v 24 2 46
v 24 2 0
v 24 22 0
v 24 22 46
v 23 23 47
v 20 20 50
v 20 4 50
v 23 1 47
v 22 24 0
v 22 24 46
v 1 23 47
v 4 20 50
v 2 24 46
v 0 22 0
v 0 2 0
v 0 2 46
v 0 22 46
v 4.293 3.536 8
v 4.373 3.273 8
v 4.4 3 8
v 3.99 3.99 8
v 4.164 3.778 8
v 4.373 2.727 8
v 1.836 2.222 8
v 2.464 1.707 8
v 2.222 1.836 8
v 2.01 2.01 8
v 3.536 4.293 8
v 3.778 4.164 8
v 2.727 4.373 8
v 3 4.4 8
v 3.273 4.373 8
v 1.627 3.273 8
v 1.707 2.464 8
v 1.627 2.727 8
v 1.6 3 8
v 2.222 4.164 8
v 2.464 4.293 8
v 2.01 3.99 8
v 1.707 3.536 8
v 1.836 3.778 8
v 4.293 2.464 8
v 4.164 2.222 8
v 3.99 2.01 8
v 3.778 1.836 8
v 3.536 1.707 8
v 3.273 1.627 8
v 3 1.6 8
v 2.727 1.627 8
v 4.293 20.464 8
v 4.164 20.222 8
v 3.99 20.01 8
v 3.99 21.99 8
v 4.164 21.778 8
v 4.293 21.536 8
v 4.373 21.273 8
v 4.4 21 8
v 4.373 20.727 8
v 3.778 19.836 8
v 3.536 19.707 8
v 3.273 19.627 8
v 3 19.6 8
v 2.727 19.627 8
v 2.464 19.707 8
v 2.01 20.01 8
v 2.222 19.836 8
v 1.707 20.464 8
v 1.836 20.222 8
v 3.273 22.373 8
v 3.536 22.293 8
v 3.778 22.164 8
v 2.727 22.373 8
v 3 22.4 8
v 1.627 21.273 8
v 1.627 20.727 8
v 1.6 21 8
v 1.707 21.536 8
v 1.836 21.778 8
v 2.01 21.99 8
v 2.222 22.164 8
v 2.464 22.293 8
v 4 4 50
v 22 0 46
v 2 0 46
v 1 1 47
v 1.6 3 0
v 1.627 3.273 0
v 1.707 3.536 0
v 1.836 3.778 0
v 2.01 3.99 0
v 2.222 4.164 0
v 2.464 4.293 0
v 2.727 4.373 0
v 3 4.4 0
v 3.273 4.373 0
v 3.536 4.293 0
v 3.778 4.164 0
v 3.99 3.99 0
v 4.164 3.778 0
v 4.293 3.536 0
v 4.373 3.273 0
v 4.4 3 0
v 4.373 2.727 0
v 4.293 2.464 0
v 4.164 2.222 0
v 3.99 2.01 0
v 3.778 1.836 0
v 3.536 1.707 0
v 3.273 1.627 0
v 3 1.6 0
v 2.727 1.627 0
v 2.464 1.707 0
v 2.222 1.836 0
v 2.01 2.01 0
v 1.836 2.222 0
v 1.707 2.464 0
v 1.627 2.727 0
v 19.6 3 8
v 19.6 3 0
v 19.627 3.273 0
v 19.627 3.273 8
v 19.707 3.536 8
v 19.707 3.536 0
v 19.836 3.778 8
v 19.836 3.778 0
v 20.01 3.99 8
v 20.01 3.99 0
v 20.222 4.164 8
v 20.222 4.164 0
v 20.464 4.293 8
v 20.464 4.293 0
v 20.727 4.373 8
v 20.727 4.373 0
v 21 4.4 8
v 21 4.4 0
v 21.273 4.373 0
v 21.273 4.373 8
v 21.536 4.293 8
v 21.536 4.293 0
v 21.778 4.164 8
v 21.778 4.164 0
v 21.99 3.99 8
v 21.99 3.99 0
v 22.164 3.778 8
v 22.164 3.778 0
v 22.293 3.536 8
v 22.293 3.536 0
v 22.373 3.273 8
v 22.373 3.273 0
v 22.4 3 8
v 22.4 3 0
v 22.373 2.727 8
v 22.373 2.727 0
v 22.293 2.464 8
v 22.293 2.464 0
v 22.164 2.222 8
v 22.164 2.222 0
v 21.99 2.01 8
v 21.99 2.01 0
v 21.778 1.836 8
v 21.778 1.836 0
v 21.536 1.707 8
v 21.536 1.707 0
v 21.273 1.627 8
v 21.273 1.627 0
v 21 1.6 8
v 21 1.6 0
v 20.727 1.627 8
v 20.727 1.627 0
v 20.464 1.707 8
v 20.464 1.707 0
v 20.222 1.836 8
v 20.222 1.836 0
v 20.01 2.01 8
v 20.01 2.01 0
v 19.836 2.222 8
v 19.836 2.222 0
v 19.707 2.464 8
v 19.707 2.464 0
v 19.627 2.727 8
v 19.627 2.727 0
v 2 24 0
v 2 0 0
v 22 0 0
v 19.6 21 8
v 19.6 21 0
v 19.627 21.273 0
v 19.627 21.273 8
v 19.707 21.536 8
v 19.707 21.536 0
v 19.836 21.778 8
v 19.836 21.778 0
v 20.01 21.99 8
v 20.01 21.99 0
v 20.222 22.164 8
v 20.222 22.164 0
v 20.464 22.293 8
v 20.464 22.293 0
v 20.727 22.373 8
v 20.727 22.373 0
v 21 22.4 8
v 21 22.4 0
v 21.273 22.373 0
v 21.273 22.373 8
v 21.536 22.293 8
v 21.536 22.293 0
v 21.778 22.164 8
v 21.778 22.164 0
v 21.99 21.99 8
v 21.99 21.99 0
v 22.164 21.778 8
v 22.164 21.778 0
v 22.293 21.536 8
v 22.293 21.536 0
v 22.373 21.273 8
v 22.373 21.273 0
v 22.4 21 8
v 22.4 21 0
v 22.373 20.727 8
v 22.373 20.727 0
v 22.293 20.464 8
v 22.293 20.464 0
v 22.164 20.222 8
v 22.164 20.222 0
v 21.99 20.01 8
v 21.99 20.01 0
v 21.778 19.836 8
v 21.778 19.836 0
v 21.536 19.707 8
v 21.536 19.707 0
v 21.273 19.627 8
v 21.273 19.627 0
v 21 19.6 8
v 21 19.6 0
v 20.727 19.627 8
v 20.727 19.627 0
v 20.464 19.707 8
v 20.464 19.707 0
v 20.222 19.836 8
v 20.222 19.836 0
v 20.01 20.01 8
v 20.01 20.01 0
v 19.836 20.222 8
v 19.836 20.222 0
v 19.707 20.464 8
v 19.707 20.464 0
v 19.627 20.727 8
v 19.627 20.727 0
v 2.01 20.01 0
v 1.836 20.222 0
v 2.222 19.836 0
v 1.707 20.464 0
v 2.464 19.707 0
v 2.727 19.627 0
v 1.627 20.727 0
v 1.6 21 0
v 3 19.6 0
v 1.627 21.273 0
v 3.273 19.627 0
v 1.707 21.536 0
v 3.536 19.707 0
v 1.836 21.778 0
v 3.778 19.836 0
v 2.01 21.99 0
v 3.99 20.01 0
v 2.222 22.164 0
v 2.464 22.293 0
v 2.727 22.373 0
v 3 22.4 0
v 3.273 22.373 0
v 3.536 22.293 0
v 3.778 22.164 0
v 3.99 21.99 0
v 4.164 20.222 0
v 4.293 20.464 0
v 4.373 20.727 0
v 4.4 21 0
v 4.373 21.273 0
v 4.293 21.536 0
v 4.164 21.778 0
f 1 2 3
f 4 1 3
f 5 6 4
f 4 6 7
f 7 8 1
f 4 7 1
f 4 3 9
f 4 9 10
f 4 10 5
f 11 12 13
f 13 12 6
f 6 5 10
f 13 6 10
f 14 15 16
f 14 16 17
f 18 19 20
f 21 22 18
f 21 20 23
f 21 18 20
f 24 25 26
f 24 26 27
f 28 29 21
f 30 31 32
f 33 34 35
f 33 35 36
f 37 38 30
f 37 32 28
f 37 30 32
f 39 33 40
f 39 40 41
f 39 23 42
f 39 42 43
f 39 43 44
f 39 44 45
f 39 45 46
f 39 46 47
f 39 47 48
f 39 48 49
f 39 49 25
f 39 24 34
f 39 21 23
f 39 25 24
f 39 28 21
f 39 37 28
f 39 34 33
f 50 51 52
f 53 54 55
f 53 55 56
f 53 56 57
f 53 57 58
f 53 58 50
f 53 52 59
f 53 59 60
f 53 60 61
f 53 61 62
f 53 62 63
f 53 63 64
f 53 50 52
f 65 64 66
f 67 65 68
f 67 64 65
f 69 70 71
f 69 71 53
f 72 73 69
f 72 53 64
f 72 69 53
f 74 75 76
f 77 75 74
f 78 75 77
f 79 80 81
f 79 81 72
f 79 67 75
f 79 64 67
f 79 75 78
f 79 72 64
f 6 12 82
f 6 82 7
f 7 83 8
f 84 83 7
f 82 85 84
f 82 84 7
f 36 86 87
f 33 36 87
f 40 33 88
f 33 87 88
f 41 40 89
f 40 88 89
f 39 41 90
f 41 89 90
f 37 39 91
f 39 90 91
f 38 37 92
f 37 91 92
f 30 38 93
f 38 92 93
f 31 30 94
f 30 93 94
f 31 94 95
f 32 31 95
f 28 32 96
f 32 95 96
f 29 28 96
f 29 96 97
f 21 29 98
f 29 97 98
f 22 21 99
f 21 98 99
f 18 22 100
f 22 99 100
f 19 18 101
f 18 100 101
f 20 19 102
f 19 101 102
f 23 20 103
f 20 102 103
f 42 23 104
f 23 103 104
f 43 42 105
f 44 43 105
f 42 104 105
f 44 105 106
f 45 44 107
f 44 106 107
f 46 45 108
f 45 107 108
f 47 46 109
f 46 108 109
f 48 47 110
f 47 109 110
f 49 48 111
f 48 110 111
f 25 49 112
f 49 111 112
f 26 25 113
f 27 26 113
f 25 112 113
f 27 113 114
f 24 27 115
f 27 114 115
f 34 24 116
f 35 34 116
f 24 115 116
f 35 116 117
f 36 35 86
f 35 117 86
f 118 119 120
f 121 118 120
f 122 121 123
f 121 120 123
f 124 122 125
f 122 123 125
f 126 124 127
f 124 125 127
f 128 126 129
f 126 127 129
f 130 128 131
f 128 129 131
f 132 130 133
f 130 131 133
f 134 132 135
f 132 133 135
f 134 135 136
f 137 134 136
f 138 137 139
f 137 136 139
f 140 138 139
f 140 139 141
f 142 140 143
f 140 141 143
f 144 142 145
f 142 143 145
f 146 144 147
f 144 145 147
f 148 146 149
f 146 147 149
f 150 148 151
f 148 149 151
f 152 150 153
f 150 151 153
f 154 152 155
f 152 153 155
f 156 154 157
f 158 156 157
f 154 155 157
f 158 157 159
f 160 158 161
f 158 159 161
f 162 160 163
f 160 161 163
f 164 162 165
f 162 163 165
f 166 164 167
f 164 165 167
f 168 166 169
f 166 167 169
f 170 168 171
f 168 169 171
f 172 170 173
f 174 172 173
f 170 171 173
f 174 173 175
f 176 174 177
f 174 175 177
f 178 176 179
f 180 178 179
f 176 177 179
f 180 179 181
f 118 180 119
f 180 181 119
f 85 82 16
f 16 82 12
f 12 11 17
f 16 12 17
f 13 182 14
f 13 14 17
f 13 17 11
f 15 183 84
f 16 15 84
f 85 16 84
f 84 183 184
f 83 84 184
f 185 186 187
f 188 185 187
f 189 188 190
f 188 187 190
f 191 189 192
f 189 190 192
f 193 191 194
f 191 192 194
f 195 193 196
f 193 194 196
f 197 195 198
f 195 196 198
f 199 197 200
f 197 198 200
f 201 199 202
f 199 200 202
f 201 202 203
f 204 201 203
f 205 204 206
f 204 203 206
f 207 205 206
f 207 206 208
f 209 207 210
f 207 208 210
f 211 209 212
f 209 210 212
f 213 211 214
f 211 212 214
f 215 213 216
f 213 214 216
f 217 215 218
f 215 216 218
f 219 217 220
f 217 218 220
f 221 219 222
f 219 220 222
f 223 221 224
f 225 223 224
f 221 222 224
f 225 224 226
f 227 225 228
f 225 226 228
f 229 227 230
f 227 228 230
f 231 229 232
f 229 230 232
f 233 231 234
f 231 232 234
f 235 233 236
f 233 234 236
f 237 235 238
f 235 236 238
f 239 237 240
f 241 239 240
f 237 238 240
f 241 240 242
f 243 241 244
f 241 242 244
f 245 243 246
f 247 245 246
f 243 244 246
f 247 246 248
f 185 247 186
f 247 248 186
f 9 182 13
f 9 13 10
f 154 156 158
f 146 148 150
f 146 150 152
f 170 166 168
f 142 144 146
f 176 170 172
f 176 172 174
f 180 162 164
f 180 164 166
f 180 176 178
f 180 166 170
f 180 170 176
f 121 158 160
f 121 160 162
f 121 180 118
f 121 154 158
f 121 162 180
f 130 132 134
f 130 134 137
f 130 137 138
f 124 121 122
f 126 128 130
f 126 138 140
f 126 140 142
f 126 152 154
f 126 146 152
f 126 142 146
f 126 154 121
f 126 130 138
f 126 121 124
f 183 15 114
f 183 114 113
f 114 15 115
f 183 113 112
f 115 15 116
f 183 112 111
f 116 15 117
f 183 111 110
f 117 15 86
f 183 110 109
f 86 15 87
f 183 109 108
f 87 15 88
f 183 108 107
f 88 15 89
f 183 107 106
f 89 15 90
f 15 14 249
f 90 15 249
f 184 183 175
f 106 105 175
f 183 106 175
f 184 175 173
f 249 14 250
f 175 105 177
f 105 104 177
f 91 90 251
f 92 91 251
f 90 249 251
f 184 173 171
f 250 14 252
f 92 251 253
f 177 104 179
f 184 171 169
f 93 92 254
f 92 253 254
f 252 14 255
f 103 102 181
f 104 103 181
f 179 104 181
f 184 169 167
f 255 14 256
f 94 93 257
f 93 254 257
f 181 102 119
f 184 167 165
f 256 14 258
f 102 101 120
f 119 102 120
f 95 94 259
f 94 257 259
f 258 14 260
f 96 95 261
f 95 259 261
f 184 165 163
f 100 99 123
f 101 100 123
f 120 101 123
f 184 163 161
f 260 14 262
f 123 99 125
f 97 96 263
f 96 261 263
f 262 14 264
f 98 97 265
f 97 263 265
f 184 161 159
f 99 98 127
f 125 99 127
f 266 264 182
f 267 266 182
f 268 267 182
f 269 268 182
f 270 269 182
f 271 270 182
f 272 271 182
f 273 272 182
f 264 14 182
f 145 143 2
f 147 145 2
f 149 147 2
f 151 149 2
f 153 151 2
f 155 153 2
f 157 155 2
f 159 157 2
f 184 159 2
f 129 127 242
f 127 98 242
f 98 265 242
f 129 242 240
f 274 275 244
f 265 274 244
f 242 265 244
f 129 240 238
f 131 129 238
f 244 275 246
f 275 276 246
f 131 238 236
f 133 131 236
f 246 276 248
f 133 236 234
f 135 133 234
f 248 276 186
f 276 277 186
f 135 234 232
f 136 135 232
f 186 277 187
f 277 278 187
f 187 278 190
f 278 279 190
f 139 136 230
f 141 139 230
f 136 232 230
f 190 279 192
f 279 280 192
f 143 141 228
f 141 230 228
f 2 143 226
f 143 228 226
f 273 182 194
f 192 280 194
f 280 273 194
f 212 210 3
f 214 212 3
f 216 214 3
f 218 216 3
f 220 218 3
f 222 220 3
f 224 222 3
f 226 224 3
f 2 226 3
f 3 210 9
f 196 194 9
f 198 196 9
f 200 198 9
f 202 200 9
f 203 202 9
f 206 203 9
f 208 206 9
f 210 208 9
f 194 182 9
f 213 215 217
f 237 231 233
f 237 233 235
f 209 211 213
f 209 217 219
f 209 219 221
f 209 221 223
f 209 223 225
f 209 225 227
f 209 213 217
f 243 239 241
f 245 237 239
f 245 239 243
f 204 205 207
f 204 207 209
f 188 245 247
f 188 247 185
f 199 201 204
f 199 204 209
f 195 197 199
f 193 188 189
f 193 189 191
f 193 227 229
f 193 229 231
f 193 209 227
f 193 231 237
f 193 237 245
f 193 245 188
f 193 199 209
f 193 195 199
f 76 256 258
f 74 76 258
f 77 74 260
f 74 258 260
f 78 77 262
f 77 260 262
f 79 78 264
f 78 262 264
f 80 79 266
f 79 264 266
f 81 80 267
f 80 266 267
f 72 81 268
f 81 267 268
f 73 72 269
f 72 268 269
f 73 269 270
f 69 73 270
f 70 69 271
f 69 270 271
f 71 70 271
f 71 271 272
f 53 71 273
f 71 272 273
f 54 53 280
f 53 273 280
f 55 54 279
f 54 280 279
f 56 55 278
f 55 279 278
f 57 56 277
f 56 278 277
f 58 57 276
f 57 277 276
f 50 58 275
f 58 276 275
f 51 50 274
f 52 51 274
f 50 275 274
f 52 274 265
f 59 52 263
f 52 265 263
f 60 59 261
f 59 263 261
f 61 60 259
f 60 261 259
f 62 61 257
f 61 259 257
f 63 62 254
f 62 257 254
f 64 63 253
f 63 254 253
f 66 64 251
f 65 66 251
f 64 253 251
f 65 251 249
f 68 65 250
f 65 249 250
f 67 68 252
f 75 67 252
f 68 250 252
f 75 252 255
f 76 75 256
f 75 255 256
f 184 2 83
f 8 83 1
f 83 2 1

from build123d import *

# Parameters (mm, degrees)
SKETCH2_W           = 24
SKETCH2_H           = 24
BOSS_EXTRUDE2_DEPTH = 50
SKETCH4_R           = 1.4
CUT_EXTRUDE1_DEPTH  = 8
CHAMFER1_SIZE       = 2
CHAMFER2_SIZE       = 4


with BuildPart() as part:
    # Sketch2 → Boss-Extrude2 (new body)
    with BuildSketch(Plane.XY):
        with Locations((12, 12)):
            Rectangle(SKETCH2_W, SKETCH2_H)
    extrude(amount=BOSS_EXTRUDE2_DEPTH)

    # Sketch4 → Cut-Extrude1 (cut)
    with BuildSketch(Plane(origin=(0, 0, 0), x_dir=(-1, 0, 0), z_dir=(0, 0, -1))):
        with Locations((-21, 21)):
            Circle(SKETCH4_R)
        with Locations((-21, 3)):
            Circle(SKETCH4_R)
        with Locations((-3, 3)):
            Circle(SKETCH4_R)
        with Locations((-3, 21)):
            Circle(SKETCH4_R)
    extrude(amount=-CUT_EXTRUDE1_DEPTH, mode=Mode.SUBTRACT)

    # Chamfer1
    chamfer1_edges = [part.edges().sort_by_distance(p)[0] for p in [
        (0, 24, 25),
        (24, 24, 25),
        (24, 0, 25),
        (0, 0, 25),
    ]]
    chamfer(chamfer1_edges, length=CHAMFER1_SIZE)

    # Chamfer2
    # the kernel refuses this chamfer: 4 mm, written as the material it takes off along each edge
    with BuildSketch(Plane(origin=(-8.286731952, 0, 50), x_dir=(0, -0.02749587661058639, -0.9996219169112968), z_dir=(1, 0, 0))) as chamfer2_piece_1:
        Polygon((CHAMFER2_SIZE * 0.999621916911, CHAMFER2_SIZE * 0.0274958766106), (-CHAMFER2_SIZE * 0.0274958766106, CHAMFER2_SIZE * 0.999621916911), (0, 0), align=None)
    extrude(amount=40.573463904, mode=Mode.SUBTRACT)
    with BuildSketch(Plane(origin=(24, -8.286731952, 50), x_dir=(-0.9996219169112968, 0, 0.027495876610585623), z_dir=(0, 1, 0)), Plane(origin=(32.286731952, 24, 50), x_dir=(0, -0.9996219169112968, 0.027495876610585623), z_dir=(-1, 0, 0)), Plane(origin=(0, 32.286731952, 50), x_dir=(0.9996219169112968, 0, 0.02749587661058563), z_dir=(0, -1, 0))) as chamfer2_piece_2:
        Polygon((CHAMFER2_SIZE * 0.999621916911, -CHAMFER2_SIZE * 0.0274958766106), (-CHAMFER2_SIZE * 0.0274958766106, -CHAMFER2_SIZE * 0.999621916911), (0, 0), align=None)
    extrude(amount=40.573463904, mode=Mode.SUBTRACT)


solid = part.part
